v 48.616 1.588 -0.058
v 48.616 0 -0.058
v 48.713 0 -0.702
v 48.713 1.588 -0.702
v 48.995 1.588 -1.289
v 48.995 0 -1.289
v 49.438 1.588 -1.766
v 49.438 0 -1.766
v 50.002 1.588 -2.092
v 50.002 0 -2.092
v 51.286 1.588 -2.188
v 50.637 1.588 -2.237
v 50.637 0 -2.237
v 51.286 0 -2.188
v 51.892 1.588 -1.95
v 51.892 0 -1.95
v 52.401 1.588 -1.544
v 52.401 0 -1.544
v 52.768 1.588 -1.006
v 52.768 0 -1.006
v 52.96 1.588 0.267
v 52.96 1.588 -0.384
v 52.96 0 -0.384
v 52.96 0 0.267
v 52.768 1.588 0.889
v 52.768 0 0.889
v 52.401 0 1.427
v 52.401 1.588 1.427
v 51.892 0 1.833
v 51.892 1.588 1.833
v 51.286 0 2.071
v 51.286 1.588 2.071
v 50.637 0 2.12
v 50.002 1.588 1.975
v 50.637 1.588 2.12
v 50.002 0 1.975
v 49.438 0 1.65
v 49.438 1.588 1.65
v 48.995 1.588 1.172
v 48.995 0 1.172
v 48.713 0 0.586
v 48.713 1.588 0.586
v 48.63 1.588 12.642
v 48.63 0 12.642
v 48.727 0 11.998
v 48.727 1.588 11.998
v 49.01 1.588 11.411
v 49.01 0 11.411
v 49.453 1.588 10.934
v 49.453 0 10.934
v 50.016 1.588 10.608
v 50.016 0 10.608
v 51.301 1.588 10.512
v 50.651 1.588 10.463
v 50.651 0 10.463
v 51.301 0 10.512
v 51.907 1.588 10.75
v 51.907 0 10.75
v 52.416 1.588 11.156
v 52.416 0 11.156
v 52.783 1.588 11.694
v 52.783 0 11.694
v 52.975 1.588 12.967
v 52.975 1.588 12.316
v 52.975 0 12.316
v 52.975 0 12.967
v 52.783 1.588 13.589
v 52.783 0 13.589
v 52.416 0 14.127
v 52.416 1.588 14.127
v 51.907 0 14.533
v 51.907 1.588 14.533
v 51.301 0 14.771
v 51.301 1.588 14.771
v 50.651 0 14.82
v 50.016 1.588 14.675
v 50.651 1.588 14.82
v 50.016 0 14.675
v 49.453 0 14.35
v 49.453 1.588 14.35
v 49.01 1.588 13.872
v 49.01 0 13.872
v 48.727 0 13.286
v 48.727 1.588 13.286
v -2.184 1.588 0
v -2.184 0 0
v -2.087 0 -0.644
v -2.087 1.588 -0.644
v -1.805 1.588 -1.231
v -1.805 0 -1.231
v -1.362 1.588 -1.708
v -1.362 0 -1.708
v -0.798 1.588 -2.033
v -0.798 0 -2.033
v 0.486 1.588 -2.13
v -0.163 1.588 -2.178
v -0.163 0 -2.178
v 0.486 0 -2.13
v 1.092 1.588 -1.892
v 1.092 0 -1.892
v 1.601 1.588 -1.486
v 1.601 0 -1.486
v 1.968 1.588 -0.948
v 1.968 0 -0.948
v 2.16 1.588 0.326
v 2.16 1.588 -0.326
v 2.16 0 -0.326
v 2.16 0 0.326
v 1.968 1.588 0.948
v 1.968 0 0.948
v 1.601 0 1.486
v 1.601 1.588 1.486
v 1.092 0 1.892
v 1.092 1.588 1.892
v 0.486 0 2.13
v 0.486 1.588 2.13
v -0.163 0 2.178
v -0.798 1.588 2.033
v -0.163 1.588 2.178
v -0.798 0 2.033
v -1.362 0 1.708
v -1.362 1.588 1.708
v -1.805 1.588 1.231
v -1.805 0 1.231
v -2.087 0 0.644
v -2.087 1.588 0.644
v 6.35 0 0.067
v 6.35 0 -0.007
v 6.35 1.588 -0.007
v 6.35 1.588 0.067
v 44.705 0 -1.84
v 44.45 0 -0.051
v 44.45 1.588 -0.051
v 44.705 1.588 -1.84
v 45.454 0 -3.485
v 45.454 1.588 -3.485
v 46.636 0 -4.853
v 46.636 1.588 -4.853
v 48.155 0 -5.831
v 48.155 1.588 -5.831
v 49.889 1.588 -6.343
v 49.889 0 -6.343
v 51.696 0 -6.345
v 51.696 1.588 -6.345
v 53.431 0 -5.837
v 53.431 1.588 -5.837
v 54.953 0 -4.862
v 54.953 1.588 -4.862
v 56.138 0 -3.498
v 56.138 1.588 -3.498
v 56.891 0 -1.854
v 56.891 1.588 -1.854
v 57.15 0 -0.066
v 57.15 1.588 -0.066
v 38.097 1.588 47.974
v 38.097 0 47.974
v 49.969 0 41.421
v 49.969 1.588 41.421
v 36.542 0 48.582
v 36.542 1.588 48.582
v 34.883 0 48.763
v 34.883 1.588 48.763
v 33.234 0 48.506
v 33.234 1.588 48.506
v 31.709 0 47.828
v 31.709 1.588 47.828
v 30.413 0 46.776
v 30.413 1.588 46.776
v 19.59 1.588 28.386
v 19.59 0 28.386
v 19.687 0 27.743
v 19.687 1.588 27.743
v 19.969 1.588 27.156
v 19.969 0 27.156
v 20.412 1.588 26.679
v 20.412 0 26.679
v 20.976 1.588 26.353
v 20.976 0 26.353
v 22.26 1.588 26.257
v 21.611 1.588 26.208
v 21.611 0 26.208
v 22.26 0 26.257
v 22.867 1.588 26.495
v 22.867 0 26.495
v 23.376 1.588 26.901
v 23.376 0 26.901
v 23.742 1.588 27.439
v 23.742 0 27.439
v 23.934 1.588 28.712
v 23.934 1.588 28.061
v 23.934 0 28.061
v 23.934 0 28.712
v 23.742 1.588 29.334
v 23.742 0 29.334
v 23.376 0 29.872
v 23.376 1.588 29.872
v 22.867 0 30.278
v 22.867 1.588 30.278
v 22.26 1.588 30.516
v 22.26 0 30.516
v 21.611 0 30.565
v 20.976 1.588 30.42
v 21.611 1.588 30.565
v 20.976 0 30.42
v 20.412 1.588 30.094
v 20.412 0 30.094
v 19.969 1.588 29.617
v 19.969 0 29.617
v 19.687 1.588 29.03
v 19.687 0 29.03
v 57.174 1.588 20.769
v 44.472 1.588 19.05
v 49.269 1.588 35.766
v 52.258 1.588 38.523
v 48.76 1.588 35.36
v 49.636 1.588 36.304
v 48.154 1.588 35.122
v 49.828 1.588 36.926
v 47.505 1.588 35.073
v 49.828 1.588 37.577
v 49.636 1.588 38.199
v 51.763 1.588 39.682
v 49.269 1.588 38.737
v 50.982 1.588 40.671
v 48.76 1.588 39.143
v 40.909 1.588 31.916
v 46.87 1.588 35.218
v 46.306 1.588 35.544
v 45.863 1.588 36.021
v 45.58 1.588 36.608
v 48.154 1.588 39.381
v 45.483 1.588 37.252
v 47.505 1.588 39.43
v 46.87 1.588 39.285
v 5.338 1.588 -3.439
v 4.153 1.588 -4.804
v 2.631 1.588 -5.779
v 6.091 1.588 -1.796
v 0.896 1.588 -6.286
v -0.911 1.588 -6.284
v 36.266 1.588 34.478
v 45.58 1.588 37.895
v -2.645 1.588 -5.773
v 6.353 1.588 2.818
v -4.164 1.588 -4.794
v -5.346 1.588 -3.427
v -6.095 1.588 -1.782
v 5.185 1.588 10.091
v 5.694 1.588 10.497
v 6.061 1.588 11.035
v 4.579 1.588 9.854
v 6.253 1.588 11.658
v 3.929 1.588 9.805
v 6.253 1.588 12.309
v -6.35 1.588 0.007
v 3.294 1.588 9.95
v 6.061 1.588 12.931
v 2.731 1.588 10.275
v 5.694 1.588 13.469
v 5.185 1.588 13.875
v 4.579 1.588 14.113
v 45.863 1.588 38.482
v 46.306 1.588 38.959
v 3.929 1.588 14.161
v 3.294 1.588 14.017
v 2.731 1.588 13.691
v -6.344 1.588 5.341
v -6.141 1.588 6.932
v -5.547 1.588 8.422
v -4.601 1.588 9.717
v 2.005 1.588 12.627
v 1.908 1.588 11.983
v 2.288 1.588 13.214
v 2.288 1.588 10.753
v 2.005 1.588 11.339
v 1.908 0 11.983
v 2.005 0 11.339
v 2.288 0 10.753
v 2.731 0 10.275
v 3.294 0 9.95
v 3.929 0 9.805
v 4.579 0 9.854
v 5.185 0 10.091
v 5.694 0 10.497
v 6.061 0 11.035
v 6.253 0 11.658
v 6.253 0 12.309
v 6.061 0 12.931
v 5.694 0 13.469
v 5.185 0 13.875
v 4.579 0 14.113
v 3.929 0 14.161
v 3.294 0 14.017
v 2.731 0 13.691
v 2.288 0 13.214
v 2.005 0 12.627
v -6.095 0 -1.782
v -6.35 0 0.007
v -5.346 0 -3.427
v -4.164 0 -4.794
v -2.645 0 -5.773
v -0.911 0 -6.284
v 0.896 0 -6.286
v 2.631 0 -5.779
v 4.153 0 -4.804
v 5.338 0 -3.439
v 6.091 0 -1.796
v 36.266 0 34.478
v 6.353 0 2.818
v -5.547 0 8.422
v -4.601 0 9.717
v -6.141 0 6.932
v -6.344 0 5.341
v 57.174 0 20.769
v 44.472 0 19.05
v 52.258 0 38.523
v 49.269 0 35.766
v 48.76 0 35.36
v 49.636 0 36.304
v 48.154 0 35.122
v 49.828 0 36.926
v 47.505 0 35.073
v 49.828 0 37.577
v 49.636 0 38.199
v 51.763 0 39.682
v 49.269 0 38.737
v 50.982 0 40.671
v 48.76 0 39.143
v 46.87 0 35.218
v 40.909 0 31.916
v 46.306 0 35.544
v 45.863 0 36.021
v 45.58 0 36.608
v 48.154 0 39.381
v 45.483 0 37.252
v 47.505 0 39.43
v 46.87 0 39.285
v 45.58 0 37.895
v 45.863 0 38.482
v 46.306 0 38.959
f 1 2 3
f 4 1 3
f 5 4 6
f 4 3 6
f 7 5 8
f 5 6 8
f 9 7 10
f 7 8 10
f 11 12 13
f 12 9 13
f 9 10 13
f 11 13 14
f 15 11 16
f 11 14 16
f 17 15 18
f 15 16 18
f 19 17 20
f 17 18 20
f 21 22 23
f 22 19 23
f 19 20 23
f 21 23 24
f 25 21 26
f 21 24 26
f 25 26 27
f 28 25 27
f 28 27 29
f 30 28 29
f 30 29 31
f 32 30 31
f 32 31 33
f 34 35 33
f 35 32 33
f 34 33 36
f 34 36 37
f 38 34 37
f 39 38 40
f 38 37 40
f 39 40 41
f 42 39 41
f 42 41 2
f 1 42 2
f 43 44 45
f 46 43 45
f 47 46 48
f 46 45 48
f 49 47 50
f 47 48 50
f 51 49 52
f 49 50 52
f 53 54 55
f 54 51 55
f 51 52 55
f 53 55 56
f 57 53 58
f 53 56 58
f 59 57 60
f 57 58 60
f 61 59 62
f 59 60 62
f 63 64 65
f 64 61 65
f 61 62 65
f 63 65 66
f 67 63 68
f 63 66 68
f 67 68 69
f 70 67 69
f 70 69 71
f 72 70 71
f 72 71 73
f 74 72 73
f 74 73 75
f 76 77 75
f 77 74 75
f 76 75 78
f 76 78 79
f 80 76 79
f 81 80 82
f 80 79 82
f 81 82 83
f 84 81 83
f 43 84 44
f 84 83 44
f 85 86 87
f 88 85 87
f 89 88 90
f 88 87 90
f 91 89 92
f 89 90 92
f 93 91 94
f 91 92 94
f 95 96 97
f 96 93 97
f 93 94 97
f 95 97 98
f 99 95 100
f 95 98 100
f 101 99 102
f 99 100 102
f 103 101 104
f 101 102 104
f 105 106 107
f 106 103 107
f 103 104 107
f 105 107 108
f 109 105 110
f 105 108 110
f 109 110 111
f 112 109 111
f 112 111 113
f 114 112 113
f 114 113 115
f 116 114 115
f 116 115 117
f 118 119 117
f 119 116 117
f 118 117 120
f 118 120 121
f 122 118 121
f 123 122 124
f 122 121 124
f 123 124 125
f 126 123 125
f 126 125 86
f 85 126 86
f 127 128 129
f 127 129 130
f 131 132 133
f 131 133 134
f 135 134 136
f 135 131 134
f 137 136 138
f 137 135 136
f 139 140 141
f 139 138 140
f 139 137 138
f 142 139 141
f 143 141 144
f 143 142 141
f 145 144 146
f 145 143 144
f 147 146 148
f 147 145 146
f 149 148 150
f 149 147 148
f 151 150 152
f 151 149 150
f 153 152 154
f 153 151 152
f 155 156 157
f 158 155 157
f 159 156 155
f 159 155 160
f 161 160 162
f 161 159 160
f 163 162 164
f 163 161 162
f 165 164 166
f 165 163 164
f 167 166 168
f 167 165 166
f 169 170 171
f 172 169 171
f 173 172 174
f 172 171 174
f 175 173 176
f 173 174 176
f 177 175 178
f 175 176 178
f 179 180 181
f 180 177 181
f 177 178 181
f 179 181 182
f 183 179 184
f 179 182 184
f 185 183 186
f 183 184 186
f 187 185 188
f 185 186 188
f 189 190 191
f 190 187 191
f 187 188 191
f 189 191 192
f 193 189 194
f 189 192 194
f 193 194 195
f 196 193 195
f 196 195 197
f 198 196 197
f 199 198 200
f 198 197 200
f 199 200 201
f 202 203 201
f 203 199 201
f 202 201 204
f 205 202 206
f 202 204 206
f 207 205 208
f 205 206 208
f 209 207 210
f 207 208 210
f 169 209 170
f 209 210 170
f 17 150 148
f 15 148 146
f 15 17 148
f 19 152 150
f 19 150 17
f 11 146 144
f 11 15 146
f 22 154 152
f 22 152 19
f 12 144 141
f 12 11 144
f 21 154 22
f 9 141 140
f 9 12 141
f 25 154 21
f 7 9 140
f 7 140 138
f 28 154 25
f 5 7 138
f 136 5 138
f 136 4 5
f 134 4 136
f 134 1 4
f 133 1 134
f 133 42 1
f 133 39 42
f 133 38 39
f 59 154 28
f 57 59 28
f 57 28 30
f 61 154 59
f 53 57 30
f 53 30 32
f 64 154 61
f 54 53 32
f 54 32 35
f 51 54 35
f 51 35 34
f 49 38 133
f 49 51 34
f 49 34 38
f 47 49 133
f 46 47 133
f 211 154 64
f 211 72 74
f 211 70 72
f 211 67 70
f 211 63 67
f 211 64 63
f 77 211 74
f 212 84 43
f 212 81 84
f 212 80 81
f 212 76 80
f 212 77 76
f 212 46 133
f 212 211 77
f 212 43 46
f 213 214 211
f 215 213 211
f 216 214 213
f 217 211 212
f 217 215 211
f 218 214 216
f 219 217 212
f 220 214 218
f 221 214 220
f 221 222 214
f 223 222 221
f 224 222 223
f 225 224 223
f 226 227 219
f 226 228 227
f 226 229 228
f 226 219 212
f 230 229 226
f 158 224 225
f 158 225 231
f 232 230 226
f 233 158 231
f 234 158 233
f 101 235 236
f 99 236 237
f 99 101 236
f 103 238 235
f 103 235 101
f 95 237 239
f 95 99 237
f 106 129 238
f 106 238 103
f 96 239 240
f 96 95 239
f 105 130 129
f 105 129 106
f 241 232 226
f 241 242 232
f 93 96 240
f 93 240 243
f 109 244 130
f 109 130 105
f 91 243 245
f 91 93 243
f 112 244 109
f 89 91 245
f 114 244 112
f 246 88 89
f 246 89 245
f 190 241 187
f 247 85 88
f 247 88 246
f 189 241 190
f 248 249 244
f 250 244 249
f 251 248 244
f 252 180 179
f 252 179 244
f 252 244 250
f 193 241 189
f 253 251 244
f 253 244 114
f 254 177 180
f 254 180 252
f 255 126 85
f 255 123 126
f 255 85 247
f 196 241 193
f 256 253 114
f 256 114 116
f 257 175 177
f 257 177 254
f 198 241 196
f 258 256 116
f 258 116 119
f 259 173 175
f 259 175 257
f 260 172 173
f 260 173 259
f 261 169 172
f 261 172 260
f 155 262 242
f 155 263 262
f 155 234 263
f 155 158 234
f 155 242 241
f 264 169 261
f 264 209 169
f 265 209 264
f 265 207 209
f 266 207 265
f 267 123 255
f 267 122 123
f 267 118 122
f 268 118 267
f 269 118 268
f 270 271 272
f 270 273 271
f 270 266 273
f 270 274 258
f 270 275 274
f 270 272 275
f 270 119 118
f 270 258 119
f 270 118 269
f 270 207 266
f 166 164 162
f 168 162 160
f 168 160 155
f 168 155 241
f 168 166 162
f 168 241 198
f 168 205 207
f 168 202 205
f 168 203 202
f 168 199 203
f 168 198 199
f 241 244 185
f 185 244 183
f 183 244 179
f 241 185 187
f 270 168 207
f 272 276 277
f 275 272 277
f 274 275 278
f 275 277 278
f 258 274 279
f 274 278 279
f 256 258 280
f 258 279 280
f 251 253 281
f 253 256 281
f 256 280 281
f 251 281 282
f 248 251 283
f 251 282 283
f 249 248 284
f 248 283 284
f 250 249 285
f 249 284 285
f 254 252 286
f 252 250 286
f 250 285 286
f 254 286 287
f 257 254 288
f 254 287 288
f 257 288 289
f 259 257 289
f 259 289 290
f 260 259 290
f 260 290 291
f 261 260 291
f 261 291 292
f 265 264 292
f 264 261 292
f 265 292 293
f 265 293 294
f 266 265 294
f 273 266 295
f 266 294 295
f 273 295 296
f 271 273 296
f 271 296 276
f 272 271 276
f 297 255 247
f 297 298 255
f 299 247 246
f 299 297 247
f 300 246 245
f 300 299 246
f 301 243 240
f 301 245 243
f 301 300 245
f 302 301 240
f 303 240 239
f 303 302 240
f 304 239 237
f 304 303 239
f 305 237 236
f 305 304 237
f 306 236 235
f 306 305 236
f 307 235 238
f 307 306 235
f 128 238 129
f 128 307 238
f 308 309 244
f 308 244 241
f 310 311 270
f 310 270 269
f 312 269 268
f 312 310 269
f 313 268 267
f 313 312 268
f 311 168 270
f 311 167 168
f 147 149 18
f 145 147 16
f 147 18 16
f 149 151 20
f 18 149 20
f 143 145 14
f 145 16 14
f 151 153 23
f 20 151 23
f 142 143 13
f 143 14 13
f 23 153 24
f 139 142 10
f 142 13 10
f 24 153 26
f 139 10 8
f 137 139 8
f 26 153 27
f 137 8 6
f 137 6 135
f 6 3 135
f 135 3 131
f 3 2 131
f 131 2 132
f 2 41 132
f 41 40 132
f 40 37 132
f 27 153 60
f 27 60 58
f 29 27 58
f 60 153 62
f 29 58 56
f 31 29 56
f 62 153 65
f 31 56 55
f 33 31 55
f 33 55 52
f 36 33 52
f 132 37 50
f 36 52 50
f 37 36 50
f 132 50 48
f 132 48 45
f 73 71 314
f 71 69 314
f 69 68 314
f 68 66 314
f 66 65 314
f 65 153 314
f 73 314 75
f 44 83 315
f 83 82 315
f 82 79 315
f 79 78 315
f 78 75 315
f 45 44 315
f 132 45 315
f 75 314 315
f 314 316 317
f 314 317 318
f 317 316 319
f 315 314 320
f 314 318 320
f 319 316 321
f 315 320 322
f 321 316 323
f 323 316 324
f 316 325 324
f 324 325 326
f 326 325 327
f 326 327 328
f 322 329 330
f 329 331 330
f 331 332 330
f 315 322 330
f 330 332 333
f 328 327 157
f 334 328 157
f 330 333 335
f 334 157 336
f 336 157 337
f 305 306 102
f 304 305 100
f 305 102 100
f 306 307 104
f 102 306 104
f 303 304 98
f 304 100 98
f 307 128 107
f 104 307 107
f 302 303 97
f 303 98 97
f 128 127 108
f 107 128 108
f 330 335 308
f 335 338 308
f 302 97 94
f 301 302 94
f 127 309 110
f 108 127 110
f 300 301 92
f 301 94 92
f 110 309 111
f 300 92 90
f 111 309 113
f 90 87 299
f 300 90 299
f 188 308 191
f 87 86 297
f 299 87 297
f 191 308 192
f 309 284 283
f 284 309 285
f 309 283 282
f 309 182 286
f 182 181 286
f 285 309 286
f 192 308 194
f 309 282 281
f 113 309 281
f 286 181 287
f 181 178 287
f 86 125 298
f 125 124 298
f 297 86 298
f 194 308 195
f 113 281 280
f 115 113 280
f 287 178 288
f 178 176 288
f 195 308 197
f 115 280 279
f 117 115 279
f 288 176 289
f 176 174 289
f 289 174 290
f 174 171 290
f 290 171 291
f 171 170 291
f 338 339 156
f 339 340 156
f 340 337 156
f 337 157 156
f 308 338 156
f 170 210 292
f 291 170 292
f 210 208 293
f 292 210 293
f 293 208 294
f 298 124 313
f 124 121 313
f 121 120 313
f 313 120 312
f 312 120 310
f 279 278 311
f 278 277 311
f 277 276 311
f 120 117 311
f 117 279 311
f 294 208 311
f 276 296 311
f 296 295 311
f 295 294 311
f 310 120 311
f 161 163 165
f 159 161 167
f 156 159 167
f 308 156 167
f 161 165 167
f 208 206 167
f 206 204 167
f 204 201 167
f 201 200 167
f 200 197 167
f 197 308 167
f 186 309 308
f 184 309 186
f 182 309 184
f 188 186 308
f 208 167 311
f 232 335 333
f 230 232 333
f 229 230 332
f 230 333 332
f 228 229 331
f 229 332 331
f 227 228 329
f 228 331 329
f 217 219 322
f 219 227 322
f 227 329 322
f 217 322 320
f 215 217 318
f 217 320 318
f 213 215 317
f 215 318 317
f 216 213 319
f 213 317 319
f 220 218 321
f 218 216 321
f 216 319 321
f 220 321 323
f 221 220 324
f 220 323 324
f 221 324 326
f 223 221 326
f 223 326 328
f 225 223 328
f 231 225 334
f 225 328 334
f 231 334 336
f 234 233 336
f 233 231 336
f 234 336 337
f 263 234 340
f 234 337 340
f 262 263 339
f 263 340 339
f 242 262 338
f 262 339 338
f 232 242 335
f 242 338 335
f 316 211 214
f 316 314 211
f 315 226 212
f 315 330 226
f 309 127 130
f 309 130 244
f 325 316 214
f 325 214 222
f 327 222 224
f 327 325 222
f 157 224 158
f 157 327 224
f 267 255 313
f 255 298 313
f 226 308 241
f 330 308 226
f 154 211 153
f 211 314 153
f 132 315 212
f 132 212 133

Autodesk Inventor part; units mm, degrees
ref_plane "YZ Plane" through (0, 0, 0) normal (1, 0, 0) x (0, 1, 0)
ref_plane "XZ Plane" through (0, 0, 0) normal (0, 1, 0) x (-1, 0, 0)
ref_plane "XY Plane" through (0, 0, 0) normal (0, 0, 1) x (1, 0, 0)
sketch "main" plane through (0, 0, 0) normal (0, 0, 1) x (1, 0, 0)
  circle A0 centre (13.3958, 31.4064) radius 2.1844
  line L0 (25.3837, 29.1351) -> (22.5582, 29.1351)
  line L1 (25.3837, 29.1351) -> (25.3095, 29.1351)
  line L2 (20.0497, 41.8351) -> (13.668, 35.4534) construction
  arc A1 (20.0497, 41.8351) -> (15.6723, 40.0972) centre (20.0497, 35.4534) ccw
  circle A2 centre (25.3837, 35.4851) radius 2.1844
  line L3 (25.3837, 41.8351) -> (20.0497, 41.8351)
  line L4 (20.0497, 41.8351) -> (29.0749, 41.8351) construction
  arc A3 (25.3837, 29.1351) -> (25.3837, 41.8351) centre (25.3837, 35.4851) ccw
  circle A4 centre (12.6837, -15.3149) radius 2.1844
  circle A5 centre (-11.9225, -12.1399) radius 2.1844
  arc A6 (-16.0947, -14.4365) -> (-13.1988, -16.7282) centre (-11.9225, -12.1399) ccw
  line L5 (-9.1363, -0.7415) -> (-6.5789, -5.3874)
  line L6 (-22.634, -2.5568) -> (-16.0947, -14.4365)
  line L7 (-6.5789, -5.3874) -> (6.2826, -8.9649)
  line L8 (6.2826, -8.9649) -> (25.3837, -8.9649)
  circle A7 centre (25.3837, -15.3149) radius 2.1844
  arc A8 (25.3837, -21.6649) -> (25.3837, -8.9649) centre (25.3837, -15.3149) ccw
  line L9 (4.5492, -21.6649) -> (25.3837, -21.6649)
  line L10 (4.5492, -21.6649) -> (-13.1988, -16.7282)
  line L11 (22.5582, 29.1351) -> (-9.1363, -0.7415)
  line L12 (-21.4268, 5.126) -> (15.6723, 40.0972)
  circle A9 centre (-3.0276, 13.7434) radius 2.1844
  arc A10 (-21.4268, 5.126) -> (-22.634, -2.5568) centre (-17.0712, 0.5054) ccw
  point P0 (7.4272, 10.3782)
  point P1 (19.0337, 40.8191)
  point P2 (-25.006, 1.7522)
  point P3 (-30.1788, -11.3461)
  dimension "d0" = 4.3688
  dimension "d1" = 135
  dimension "d2" = 12.7
  dimension "d3" = 6.35
  dimension "d4" = 12.7
  dimension "d5" = 4.3688
  dimension "d6" = 4.3688
  dimension "d9" = 4.7625
  dimension "d10" = 47.625
  dimension "d11" = 37.3062
sketch "Sketch1" plane through (0, 0, 0) normal (0, 1, 0) x (-1, 0, 0)
  circle A0 centre (-4.0925, 11.9832) radius 2.1844
  line L0 (-6.35, -0.0073) -> (-6.3532, 2.8182)
  line L1 (-6.35, -0.0073) -> (-6.3501, 0.0669)
  line L2 (6.3439, 5.3413) -> (-0.0452, 11.7157) construction
  arc A1 (6.3439, 5.3413) -> (4.6009, 9.7167) centre (-0.0379, 5.334) ccw
  circle A2 centre (0, 0) radius 2.1844
  line L3 (6.35, 0.0073) -> (6.3439, 5.3413)
  line L4 (6.3439, 5.3413) -> (6.3542, -3.6839) construction
  arc A3 (-6.35, -0.0073) -> (6.35, 0.0073) centre (0, 0) ccw
  circle A4 centre (-50.8145, 12.6417) radius 2.1844
  circle A5 centre (-47.6678, 37.2516) radius 2.1844
  arc A6 (-49.9692, 41.4211) -> (-52.2575, 38.5226) centre (-47.6678, 37.2516) ccw
  line L5 (-36.2662, 34.4785) -> (-40.9092, 31.9157)
  line L6 (-38.097, 47.9741) -> (-49.9692, 41.4211)
  line L7 (-40.9092, 31.9157) -> (-44.4719, 19.0501)
  line L8 (-44.4719, 19.0501) -> (-44.45, -0.051)
  circle A7 centre (-50.8, -0.0583) radius 2.1844
  arc A8 (-57.15, -0.0656) -> (-44.45, -0.051) centre (-50.8, -0.0583) ccw
  line L9 (-57.1739, 20.769) -> (-57.15, -0.0656)
  line L10 (-57.1739, 20.769) -> (-52.2575, 38.5226)
  line L11 (-6.3532, 2.8182) -> (-36.2662, 34.4785)
  line L12 (-30.4128, 46.7757) -> (4.6009, 9.7167)
  circle A9 centre (-21.7743, 28.3864) radius 2.1844
  arc A10 (-30.4128, 46.7757) -> (-38.097, 47.9741) centre (-35.0285, 42.4147) ccw
  point P0 (0, 0)
  point P1 (-6.3501, 0.0669)
extrude "Extrusion1" add sketch "Sketch1" along normal blind 1.5875
properties part number "Ring Funnel" material "Acetal Resin, White"
